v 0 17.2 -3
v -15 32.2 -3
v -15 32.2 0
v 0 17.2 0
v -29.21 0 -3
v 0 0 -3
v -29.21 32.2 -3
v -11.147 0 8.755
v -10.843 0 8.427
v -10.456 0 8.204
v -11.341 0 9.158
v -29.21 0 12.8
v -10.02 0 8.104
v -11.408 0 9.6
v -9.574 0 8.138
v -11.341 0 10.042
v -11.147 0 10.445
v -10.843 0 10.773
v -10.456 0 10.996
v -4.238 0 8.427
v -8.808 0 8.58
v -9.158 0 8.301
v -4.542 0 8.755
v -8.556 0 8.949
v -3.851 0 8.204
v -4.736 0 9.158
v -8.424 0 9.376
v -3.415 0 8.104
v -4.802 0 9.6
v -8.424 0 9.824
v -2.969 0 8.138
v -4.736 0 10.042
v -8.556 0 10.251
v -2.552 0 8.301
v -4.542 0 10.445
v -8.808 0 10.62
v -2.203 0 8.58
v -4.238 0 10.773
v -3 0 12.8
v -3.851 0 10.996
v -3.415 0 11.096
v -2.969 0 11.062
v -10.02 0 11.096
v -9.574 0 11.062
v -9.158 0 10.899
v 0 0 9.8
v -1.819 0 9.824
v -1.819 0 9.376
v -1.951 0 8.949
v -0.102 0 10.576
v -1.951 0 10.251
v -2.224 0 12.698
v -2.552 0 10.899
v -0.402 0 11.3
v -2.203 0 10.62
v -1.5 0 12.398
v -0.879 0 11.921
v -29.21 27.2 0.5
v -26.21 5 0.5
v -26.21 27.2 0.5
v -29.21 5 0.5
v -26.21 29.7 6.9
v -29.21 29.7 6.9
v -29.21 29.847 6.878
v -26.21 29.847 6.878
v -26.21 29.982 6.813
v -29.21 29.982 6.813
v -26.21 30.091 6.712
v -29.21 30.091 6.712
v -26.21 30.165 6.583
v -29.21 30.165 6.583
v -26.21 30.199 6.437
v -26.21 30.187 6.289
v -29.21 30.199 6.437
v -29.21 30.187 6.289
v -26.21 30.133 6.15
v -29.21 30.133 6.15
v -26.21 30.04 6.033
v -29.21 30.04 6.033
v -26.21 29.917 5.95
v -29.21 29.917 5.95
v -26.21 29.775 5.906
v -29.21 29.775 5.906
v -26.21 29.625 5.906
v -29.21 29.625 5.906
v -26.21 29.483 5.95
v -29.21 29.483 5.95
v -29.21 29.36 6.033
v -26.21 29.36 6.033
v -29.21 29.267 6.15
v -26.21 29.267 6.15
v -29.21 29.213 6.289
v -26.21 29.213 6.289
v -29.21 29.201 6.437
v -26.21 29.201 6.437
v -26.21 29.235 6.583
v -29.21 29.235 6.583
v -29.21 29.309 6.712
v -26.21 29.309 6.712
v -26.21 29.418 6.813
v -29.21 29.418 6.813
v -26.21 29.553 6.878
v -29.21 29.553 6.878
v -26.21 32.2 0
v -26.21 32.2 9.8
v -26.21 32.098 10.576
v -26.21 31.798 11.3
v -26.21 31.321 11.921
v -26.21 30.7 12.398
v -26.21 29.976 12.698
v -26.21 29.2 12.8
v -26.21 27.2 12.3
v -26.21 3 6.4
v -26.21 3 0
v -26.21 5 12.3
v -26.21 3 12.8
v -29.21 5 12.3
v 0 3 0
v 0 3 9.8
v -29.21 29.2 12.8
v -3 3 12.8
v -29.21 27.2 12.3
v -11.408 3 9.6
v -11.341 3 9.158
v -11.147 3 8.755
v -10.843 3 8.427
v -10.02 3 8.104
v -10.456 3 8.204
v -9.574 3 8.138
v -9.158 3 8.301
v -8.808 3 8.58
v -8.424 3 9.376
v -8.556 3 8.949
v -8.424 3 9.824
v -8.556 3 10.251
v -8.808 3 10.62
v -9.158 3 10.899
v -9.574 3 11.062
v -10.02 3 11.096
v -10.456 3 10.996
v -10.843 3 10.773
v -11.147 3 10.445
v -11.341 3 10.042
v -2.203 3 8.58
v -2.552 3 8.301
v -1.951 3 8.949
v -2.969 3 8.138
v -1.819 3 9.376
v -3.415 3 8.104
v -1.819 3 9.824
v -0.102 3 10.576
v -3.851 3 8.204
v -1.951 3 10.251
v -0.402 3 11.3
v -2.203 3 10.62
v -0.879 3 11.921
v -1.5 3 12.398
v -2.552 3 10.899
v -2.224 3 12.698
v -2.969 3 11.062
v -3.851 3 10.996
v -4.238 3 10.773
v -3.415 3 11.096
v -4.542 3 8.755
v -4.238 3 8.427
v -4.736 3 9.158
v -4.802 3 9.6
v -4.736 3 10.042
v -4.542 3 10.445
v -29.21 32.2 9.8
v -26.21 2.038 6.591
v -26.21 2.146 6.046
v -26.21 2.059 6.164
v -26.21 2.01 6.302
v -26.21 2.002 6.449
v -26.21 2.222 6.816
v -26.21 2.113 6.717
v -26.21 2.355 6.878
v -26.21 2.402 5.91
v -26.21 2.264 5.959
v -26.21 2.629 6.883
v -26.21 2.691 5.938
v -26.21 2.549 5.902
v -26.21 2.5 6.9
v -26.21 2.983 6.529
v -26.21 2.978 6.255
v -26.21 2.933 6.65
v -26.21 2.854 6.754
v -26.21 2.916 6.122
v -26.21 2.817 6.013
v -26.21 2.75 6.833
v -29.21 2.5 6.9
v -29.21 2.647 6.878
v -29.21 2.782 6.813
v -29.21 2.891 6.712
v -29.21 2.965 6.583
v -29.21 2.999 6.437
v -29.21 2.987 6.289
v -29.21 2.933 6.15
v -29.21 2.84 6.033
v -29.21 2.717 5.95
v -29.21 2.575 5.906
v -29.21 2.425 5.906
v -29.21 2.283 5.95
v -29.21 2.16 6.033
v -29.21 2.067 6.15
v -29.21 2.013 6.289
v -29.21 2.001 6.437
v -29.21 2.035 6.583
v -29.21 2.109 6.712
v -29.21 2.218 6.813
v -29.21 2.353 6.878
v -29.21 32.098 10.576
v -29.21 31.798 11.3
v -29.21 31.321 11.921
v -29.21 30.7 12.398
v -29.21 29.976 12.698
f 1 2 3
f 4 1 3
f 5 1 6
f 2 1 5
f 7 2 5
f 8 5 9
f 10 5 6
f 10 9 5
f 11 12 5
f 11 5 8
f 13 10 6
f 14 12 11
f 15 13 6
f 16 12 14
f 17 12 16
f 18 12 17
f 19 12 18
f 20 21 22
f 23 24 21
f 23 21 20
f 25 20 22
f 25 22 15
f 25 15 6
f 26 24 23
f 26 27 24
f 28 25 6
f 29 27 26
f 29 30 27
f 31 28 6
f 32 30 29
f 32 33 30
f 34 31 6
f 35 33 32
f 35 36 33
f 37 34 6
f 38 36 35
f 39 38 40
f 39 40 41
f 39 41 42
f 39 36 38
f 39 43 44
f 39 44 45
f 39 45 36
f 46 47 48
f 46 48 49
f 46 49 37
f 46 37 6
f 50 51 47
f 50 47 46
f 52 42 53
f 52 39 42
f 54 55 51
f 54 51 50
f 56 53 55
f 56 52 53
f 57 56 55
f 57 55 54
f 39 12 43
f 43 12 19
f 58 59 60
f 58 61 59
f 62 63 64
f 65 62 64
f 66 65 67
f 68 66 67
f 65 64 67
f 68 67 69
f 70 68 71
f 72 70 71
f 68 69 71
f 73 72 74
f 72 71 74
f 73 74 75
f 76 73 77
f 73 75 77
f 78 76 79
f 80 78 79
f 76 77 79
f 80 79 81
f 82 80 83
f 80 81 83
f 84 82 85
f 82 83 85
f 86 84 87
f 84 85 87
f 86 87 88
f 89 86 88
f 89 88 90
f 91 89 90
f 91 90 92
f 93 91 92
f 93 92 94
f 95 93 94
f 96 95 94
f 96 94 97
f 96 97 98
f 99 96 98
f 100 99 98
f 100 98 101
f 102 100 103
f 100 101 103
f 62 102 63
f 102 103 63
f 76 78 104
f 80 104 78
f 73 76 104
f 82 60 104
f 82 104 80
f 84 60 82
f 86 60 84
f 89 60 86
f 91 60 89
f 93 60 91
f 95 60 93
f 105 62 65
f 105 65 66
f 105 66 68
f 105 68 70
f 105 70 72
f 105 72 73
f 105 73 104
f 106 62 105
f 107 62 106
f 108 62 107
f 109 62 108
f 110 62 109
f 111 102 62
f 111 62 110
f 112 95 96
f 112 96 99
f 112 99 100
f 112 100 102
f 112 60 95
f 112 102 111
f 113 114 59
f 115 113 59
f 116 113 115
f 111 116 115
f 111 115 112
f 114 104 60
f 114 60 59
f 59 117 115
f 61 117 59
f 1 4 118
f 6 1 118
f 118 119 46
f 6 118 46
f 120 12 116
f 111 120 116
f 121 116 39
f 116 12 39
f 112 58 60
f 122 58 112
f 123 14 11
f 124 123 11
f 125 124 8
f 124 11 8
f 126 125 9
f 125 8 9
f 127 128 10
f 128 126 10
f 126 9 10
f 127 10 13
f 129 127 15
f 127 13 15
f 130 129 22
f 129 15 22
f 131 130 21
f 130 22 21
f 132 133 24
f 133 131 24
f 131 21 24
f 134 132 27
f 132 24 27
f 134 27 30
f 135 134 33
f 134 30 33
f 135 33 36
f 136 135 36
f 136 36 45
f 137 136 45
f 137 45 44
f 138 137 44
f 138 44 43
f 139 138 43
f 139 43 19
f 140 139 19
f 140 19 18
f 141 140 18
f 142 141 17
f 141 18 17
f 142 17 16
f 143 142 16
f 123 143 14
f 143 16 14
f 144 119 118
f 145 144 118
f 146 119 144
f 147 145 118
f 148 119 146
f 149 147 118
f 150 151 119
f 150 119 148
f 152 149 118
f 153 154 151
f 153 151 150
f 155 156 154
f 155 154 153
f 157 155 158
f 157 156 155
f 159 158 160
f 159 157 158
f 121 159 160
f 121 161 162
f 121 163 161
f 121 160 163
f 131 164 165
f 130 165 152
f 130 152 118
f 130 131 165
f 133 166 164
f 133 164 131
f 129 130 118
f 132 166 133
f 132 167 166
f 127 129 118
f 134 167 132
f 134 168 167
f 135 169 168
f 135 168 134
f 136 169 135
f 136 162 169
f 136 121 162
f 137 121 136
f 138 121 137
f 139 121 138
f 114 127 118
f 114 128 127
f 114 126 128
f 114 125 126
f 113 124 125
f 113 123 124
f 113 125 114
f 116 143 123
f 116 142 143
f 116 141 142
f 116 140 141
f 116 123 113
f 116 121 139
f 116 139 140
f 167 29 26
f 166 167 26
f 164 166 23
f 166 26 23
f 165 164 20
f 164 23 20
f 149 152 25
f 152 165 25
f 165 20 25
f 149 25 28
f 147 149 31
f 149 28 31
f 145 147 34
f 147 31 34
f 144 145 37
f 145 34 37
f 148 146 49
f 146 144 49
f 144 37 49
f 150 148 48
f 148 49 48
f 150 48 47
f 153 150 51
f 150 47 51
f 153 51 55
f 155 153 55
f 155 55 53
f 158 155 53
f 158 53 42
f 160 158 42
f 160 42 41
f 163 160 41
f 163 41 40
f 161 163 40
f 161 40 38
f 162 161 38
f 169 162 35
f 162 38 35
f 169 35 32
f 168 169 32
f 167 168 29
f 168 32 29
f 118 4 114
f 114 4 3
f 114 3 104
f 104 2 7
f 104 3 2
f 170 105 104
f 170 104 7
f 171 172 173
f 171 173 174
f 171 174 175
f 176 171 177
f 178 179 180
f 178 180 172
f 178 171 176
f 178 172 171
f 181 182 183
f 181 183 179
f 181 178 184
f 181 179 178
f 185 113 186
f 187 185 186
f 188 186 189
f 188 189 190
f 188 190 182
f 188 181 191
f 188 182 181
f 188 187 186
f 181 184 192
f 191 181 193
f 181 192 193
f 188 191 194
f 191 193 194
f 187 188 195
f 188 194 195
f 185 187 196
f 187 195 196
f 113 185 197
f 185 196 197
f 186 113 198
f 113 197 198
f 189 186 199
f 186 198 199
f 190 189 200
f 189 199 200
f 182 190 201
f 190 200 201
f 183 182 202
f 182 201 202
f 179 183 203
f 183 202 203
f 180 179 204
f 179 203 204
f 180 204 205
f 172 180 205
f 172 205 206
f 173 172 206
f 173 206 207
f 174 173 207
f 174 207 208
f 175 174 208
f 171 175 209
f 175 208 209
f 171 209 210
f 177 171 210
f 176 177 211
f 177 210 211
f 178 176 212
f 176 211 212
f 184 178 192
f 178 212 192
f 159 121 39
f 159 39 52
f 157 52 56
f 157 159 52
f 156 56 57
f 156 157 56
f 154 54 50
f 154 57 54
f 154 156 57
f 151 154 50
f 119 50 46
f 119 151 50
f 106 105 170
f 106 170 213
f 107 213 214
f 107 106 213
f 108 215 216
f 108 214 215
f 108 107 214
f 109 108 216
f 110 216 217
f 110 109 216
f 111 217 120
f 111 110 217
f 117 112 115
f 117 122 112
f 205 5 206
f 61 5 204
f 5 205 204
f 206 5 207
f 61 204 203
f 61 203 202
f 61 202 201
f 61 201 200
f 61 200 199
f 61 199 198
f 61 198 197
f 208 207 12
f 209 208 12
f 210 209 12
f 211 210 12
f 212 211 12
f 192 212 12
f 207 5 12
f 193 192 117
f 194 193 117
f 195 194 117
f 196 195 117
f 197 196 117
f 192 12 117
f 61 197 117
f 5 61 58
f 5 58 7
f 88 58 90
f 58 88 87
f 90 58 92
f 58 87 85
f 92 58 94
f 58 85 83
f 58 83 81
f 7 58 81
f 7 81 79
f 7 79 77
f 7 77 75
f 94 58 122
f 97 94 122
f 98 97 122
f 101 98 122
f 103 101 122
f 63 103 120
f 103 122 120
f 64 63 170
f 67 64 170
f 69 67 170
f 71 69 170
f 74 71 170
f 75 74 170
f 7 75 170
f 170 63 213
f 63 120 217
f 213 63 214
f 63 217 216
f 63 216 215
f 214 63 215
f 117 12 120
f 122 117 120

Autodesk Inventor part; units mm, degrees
ref_plane "YZ Plane" through (0, 0, 0) normal (1, 0, 0) x (0, 1, 0)
ref_plane "XZ Plane" through (0, 0, 0) normal (0, 1, 0) x (-1, 0, 0)
ref_plane "XY Plane" through (0, 0, 0) normal (0, 0, 1) x (1, 0, 0)
sketch "Sketch1" plane through (0, 0, 0) normal (0, 1, 0) x (-1, 0, 0)
  line L0 (29.21, 0) -> (29.21, 12.8)
  line L1 (29.21, 12.8) -> (0, 12.8)
  line L2 (29.21, 12.8) -> (13.21, 12.8)
  circle A0 centre (3.3025, 9.6) radius 1.5
  circle A1 centre (9.9075, 9.6) radius 1.5
  line L3 (0, 12.8) -> (0, 0)
  line L4 (0, 0) -> (29.21, 0)
  dimension "d0" = 12.8
  dimension "d1" = 16
  dimension "d4" = 3
  dimension "d5" = 3
extrude "Extrusion1" add sketch "Sketch1" along normal blind 3
sketch "Sketch2" plane through (0, 3, 0) normal (0, 1, 0) x (1, 0, 0)
  line L0 (0, 0) -> (-29.21, 0) projected
  line L1 (-29.21, -12.8) -> (0, -12.8) projected
  line L2 (-29.21, 0) -> (-26.21, 0)
  line L3 (-26.21, 0) -> (-26.21, -12.8)
  line L4 (-26.21, -12.8) -> (-29.21, -12.8)
  line L5 (-29.21, -12.8) -> (-29.21, 0)
  dimension "d8" = 3
extrude "Extrusion2" add sketch "Sketch2" along normal blind 29.2
sketch "Sketch3" plane through (-29.21, 0, 0) normal (-1, 0, 0) x (0, 0, 1)
  line L0 (12.8, 0) -> (12.8, 32.2) projected
  line L1 (12.8, 16.1) -> (0, 16.1)
  line L2 (0, 0) -> (0, 32.2) projected
  line L3 (6.4, 27.2) -> (12.3, 27.2)
  line L4 (12.3, 27.2) -> (12.3, 5)
  line L5 (12.3, 5) -> (0.5, 5)
  line L6 (0.5, 5) -> (0.5, 27.2)
  line L7 (0.5, 27.2) -> (6.4, 27.2)
  line L8 (0, 0) -> (12.8, 0) projected
  circle A0 centre (6.4, 2.5) radius 0.5
  line L9 (0, 32.2) -> (12.8, 32.2) projected
  circle A1 centre (6.4, 29.7) radius 0.5
  dimension "d12" = 5.9
  dimension "d13" = 11.8
  dimension "d14" = 1
  dimension "d15" = 1
extrude "Extrusion3" cut sketch "Sketch3" against normal blind 3 contours L4 L5 L6 L1 | L1 L6 L7 L3 L4 | A0 | A1
sketch "Эскиз5" plane through (0, 0, 0) normal (0, 0, -1) x (-1, 0, 0)
  line L0 (29.21, 0) -> (0, 0) projected
  line L1 (26.21, 32.2) -> (29.21, 32.2) projected
  line L2 (0, 0) -> (29.21, 0)
  line L3 (29.21, 0) -> (29.21, 32.2)
  line L4 (29.21, 32.2) -> (0, 32.2)
  line L5 (0, 32.2) -> (0, 0)
extrude "Выдавливание4" add sketch "Эскиз5" along normal blind 3
chamfer "Фаска1" distance 15 angle 45 1 edges at (0, 32.2, -1.5)
fillet "Сопряжение3" radius 3 2 edges at (0, 1.5, 12.8) (-27.71, 32.2, 12.8)
